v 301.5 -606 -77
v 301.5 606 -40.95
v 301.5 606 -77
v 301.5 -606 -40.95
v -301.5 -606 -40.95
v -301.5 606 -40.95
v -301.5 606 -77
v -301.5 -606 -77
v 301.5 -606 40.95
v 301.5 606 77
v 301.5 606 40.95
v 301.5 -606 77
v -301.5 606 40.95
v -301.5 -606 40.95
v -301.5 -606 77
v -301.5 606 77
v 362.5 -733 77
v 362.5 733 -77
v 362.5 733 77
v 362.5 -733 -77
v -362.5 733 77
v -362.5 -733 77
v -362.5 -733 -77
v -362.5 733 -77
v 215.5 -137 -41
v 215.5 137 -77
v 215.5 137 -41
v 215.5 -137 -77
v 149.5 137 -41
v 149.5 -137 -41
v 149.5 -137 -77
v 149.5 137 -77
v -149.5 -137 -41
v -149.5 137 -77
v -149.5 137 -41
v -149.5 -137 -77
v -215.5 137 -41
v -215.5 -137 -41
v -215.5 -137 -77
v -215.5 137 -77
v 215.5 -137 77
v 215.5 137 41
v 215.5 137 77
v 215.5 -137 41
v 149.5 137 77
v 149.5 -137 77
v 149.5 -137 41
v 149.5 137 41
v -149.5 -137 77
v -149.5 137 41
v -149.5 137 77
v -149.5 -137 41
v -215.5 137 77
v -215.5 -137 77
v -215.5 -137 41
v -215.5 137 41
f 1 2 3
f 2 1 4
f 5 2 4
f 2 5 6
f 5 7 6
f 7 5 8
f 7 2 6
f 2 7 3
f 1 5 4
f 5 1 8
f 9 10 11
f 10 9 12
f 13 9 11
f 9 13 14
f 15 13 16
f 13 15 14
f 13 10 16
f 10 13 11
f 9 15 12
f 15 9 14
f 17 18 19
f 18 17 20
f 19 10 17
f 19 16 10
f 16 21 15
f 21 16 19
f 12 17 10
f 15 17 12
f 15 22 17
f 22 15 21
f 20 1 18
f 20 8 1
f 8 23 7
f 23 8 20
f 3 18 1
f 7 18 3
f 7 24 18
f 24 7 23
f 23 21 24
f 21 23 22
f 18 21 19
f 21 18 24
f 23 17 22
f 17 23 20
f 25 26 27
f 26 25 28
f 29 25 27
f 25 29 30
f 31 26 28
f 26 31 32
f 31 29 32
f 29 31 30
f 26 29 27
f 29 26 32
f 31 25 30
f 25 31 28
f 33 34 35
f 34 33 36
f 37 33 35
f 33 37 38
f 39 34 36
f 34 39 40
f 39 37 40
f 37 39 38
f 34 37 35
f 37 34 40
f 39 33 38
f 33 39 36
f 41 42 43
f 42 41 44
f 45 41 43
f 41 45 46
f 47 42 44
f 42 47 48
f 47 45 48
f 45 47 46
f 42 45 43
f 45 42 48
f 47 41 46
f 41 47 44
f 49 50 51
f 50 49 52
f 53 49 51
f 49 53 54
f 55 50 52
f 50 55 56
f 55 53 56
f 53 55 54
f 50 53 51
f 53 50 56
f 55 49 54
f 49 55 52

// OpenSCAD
// Box dimensions
box_width = 725;
box_depth = 1466;
box_height = 154;

// Recess parameters
recess_depth = 36;
bezel_width_x = 61;
bezel_width_y = 127;

// Calculated recess dimensions
recess_width = box_width - (2 * bezel_width_x);
recess_depth_y = box_depth - (2 * bezel_width_y);

// Protruding box parameters
protrude_width = 66;
protrude_depth = 274;
protrude_height = 36;
protrude_x_offset = (recess_width/2) - 86 - (protrude_width/2); // 86 units from end of recess

union() {
    difference() {
        // Main box
        cube([box_width, box_depth, box_height], center=true);
        
        // Recess cutouts on top and bottom using a loop
        for (z_pos = [-(box_height - recess_depth) / 2, (box_height - recess_depth) / 2]) {
            translate([0, 0, z_pos]) {
                cube([recess_width, recess_depth_y, recess_depth + 0.1], center=true);
            }
        }
    }
    
    // Protruding boxes on both sides of top and bottom recess areas
    for (z_pos = [-(box_height - recess_depth) / 2, (box_height - recess_depth) / 2]) {
        for (x_pos = [protrude_x_offset, -protrude_x_offset]) {
            translate([x_pos, 0, z_pos]) {
                cube([protrude_width, protrude_depth, protrude_height], center=true);
            }
        }
    }
}
